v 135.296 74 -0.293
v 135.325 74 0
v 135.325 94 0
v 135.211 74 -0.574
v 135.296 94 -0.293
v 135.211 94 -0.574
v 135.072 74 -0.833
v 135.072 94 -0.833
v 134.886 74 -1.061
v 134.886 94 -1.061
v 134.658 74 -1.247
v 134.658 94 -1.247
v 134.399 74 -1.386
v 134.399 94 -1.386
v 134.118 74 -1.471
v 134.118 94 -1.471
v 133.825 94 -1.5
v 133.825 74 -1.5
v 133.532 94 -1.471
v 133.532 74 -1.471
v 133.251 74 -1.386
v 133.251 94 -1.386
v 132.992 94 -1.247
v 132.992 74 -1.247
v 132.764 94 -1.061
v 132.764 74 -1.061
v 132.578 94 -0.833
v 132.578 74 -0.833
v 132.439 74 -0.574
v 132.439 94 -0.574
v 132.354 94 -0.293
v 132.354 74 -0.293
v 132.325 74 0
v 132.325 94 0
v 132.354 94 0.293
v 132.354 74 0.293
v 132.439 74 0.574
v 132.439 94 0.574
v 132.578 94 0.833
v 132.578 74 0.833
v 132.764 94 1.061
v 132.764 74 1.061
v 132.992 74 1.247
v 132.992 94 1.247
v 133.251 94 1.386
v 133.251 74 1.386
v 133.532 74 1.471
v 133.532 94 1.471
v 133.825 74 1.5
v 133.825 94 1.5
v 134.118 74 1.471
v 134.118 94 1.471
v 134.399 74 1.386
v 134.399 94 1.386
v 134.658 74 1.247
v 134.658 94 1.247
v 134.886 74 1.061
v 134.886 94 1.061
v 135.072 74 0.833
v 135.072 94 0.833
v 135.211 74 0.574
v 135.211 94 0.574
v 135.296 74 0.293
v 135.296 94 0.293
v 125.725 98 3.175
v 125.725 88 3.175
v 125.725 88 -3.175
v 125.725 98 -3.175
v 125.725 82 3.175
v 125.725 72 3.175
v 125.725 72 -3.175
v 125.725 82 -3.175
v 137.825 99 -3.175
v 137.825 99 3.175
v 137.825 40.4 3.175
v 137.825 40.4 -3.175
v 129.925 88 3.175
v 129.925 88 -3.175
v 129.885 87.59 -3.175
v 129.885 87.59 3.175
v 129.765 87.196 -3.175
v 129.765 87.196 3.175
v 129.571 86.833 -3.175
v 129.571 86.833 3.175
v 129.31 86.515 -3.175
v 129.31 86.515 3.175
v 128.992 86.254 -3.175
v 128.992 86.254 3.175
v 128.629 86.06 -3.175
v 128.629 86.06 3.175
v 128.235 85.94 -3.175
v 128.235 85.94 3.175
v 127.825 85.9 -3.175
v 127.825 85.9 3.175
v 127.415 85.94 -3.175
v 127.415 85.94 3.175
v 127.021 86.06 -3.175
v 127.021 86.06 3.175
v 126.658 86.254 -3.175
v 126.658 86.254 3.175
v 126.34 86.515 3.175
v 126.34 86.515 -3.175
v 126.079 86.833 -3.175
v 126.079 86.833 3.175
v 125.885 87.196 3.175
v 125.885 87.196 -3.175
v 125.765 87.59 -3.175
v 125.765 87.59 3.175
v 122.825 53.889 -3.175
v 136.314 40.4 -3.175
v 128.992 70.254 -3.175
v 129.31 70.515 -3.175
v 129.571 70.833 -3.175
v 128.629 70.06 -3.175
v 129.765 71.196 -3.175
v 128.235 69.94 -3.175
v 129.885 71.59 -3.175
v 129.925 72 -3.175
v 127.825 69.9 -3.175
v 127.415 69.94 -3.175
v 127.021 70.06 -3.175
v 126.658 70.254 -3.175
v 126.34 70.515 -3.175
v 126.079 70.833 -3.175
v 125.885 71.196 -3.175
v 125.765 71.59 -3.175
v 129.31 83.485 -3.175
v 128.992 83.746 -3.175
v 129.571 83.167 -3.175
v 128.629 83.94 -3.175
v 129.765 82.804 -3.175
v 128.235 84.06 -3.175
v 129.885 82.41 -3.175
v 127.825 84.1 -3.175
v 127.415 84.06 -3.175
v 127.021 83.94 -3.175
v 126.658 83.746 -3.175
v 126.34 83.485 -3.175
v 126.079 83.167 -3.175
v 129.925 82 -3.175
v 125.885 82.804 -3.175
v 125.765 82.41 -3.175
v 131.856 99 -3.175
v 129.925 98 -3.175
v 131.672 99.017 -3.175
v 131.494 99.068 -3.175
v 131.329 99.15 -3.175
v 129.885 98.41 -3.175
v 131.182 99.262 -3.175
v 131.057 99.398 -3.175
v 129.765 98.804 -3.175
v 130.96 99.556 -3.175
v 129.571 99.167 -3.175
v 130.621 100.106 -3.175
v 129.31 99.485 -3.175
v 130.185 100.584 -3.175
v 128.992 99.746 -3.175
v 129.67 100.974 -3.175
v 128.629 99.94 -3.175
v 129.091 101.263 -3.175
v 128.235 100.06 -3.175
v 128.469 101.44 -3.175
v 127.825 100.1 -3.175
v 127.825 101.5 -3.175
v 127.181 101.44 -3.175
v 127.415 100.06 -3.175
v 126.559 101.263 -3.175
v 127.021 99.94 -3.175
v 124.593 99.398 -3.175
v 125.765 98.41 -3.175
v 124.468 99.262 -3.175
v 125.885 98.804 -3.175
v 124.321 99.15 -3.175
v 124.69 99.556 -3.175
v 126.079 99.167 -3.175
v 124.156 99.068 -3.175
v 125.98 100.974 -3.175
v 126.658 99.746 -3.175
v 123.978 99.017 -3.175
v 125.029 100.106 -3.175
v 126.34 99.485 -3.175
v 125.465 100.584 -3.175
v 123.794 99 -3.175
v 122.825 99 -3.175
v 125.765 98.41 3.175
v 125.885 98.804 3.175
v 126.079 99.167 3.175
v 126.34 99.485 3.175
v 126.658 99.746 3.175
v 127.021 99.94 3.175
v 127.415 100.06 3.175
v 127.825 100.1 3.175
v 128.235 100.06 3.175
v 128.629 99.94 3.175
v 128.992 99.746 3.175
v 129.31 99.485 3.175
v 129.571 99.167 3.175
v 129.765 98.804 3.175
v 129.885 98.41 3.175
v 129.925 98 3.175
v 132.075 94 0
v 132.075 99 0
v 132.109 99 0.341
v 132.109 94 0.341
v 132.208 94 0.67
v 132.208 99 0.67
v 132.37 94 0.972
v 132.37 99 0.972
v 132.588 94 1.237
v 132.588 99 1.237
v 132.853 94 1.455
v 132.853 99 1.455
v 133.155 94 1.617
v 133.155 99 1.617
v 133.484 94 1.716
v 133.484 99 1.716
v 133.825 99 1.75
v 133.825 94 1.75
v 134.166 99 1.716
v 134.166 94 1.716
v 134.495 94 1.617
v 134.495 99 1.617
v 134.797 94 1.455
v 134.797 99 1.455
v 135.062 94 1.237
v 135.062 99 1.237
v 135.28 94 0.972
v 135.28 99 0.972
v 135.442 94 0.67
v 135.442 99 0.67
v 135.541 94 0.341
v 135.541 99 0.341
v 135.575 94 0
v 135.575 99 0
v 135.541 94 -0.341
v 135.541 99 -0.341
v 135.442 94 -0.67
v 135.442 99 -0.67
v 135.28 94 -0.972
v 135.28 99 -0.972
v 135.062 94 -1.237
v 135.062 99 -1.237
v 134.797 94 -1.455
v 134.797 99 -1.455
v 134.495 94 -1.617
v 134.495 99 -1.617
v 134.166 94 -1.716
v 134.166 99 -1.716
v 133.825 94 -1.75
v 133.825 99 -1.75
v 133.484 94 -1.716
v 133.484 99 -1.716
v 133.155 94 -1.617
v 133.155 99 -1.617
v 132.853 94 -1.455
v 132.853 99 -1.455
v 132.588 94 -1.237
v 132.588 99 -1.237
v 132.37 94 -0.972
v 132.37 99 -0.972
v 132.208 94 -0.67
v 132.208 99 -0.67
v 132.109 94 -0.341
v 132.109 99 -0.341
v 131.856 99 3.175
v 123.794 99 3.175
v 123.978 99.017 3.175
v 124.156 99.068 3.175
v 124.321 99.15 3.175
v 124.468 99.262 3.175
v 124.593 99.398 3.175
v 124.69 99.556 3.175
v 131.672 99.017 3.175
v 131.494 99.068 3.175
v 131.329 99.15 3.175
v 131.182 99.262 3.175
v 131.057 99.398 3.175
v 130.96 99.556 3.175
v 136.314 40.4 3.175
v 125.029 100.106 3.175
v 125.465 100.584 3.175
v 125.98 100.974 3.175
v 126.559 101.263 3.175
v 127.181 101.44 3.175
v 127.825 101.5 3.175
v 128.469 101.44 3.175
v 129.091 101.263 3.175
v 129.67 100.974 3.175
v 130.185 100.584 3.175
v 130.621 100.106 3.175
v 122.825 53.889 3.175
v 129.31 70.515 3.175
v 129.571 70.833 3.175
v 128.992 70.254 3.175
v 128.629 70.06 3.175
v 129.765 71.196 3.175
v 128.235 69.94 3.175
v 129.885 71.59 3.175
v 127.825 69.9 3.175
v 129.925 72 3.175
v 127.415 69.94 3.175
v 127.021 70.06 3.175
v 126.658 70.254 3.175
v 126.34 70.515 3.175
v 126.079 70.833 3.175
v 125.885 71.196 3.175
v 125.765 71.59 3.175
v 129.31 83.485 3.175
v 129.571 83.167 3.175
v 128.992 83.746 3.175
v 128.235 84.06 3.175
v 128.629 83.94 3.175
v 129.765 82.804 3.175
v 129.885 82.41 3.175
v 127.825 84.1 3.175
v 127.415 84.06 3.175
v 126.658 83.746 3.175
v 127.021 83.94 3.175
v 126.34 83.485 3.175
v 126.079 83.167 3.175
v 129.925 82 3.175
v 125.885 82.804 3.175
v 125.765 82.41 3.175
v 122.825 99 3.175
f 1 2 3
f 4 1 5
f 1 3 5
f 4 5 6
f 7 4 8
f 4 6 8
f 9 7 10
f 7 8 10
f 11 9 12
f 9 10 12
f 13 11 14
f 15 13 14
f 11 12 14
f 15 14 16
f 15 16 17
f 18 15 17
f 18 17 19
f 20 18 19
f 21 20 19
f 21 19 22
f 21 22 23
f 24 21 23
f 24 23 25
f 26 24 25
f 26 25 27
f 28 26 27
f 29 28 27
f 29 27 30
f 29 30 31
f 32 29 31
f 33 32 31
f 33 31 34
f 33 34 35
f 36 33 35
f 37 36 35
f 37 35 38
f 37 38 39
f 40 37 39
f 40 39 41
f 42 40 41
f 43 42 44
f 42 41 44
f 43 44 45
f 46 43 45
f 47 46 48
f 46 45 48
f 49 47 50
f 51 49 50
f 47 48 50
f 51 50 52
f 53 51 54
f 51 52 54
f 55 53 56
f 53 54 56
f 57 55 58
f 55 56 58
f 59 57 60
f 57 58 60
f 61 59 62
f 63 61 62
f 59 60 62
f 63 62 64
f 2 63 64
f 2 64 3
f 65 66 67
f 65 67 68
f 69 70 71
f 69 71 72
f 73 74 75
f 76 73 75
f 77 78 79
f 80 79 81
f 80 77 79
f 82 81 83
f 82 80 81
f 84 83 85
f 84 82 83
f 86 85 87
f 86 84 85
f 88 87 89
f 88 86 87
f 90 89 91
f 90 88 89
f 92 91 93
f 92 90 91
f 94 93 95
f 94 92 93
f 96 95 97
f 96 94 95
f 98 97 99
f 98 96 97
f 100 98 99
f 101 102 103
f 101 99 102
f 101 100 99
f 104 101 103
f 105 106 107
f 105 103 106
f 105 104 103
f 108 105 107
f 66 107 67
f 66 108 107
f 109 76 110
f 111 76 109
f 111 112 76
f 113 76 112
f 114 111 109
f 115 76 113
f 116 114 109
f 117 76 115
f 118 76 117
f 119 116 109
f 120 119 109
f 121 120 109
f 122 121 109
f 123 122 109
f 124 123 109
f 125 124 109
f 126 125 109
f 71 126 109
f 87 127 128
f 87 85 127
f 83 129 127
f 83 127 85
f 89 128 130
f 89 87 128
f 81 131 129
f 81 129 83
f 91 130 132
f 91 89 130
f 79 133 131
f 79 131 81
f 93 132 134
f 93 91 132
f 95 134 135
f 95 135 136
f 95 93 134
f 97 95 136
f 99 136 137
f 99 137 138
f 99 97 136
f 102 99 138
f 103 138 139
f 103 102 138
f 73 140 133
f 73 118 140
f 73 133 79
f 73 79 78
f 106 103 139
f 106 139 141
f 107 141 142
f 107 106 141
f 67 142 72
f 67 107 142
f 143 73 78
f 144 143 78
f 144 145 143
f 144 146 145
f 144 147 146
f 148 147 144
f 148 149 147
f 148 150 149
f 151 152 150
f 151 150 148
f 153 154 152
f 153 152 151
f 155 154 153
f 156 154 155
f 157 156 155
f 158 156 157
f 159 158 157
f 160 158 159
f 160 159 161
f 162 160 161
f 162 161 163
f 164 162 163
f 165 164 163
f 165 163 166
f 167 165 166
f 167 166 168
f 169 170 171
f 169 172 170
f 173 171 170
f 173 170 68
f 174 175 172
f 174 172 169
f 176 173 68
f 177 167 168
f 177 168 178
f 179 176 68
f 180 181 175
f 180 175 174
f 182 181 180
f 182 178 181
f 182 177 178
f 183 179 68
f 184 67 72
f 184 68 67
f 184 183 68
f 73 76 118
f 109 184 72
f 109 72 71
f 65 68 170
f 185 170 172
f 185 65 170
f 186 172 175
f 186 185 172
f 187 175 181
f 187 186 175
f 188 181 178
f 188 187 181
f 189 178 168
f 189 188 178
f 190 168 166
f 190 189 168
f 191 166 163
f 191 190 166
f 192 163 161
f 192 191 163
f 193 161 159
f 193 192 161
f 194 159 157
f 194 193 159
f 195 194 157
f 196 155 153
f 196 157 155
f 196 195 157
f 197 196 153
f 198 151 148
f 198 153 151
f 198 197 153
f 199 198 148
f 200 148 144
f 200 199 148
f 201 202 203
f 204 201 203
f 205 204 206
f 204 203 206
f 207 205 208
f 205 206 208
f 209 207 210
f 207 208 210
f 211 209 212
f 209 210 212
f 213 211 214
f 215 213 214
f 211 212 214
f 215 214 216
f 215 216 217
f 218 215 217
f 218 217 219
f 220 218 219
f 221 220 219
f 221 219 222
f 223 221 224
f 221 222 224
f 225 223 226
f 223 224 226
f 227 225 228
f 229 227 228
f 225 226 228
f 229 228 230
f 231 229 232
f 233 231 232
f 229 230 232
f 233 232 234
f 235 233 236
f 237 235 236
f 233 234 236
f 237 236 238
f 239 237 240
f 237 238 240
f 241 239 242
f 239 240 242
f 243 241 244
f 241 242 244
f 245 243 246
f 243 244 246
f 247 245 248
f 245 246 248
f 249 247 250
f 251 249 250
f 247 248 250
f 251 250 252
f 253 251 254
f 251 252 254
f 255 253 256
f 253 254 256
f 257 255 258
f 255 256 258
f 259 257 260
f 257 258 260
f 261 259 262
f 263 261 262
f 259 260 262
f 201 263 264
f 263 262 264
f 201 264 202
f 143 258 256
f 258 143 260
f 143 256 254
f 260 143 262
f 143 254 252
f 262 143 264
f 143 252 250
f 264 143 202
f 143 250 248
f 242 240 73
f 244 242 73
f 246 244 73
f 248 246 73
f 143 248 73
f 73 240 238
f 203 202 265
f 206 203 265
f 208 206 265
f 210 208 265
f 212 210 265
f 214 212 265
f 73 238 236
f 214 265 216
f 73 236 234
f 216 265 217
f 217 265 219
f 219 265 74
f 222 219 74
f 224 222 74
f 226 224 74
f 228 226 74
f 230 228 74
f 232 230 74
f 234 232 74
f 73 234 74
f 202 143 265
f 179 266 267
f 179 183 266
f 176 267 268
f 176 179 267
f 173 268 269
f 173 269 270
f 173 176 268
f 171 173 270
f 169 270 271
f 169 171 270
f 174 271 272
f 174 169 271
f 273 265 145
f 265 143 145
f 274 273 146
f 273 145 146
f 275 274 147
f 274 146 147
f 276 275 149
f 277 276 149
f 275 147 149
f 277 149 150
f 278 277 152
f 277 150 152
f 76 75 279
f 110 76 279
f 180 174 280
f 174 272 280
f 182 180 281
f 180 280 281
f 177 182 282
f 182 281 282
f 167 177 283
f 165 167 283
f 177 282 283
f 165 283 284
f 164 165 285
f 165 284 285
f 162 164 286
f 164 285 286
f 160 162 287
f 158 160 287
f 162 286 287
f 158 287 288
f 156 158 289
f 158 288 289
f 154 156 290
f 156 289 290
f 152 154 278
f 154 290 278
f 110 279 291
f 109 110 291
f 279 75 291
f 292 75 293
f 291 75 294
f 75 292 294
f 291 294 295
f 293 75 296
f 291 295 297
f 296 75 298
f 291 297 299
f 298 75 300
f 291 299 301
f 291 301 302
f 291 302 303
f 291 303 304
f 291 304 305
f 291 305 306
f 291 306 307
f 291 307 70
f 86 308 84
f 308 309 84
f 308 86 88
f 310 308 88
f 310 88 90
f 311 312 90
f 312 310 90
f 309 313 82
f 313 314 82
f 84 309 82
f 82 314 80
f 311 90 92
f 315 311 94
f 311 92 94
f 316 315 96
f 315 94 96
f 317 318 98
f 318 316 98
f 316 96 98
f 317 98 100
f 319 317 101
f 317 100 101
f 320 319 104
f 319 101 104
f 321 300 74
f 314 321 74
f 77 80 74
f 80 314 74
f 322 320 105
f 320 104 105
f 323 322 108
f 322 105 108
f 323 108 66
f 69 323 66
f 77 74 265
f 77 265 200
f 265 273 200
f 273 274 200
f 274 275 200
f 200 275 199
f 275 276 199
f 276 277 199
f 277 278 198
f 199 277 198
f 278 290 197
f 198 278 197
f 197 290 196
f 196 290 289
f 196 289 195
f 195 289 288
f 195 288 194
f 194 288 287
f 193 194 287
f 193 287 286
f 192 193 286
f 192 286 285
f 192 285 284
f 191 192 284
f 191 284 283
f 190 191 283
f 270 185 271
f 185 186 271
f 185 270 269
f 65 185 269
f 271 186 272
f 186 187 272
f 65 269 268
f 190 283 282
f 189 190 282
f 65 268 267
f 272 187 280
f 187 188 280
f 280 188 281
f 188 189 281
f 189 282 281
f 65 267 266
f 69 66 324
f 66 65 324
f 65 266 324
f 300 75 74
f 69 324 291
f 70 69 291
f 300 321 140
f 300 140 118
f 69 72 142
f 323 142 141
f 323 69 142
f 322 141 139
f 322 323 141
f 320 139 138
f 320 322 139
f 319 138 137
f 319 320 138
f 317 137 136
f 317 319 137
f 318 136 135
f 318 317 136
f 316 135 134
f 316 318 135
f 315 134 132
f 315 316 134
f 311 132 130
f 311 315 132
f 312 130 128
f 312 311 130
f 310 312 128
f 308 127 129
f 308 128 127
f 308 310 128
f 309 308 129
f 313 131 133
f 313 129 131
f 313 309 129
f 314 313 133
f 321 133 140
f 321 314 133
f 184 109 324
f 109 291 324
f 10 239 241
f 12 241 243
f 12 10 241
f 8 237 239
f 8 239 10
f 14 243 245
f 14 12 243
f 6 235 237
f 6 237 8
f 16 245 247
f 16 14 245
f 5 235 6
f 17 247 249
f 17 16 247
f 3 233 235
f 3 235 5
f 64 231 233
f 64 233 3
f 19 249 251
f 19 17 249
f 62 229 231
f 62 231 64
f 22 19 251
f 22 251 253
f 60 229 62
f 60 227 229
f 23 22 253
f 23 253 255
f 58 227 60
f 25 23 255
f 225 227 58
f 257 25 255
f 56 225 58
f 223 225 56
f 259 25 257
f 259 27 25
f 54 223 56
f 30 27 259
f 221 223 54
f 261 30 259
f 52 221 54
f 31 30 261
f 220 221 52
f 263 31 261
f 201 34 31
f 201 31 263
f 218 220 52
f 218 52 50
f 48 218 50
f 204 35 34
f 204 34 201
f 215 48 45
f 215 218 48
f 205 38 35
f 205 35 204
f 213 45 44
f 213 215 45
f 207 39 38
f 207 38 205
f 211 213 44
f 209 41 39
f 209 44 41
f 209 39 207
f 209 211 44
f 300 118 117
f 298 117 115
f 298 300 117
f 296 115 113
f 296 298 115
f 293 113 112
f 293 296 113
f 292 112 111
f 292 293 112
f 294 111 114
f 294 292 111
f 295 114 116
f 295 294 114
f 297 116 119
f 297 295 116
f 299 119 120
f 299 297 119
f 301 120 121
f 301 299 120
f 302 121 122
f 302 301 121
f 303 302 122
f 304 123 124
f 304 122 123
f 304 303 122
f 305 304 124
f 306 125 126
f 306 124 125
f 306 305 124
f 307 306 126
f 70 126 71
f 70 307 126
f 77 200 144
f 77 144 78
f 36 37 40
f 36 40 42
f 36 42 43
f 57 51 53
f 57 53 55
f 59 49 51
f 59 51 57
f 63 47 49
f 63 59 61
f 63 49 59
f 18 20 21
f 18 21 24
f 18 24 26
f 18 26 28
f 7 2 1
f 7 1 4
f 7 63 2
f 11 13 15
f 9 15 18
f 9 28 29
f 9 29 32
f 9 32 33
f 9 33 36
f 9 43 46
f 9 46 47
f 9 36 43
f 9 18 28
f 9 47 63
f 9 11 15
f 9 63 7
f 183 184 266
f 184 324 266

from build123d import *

# Parameters (mm, degrees)
BOSS_EXTRUDE1_DEPTH      = 3.175
BOSS_EXTRUDE1_DEPTH_BACK = 3.175
CUT_EXTRUDE1_DEPTH       = 7.35
SKETCH3_R                = 1.5
CUT_EXTRUDE2_DEPTH       = 25
SKETCH4_R                = 1.75
CUT_EXTRUDE3_DEPTH       = 5
FILLET1_R                = 1


with BuildPart() as part:
    # Sketch1 → Boss-Extrude1 (new body, two sides)
    with BuildSketch(Plane.XY) as boss_extrude1_sk:
        with BuildLine():
            Line((136.313708499, 40.4), (122.825, 53.888708499))
            Line((122.825, 53.888708499), (122.825, 99))
            Line((122.825, 99), (124.470898034, 99))
            ThreePointArc((124.470898034, 99), (127.825, 101.5), (131.179101966, 99))
            Line((131.179101966, 99), (137.825, 99))
            Line((137.825, 99), (137.825, 40.4))
            Line((137.825, 40.4), (136.313708499, 40.4))
        make_face()
    extrude(amount=BOSS_EXTRUDE1_DEPTH)
    extrude(boss_extrude1_sk.sketch, amount=-BOSS_EXTRUDE1_DEPTH_BACK)

    # Sketch2 → Cut-Extrude1 (cut, through all)
    with BuildSketch(Plane.XY.offset(3.175)):
        with BuildLine():
            Line((125.725, 72), (125.725, 82))
            ThreePointArc((125.725, 82), (127.825, 84.1), (129.925, 82))
            Line((129.925, 82), (129.925, 72))
            ThreePointArc((129.925, 72), (127.825, 69.9), (125.725, 72))
        make_face()
        with BuildLine():
            Line((125.725, 88), (125.725, 98))
            ThreePointArc((125.725, 98), (127.825, 100.1), (129.925, 98))
            Line((129.925, 98), (129.925, 88))
            ThreePointArc((129.925, 88), (127.825, 85.9), (125.725, 88))
        make_face()
    extrude(amount=-CUT_EXTRUDE1_DEPTH, mode=Mode.SUBTRACT)

    # Sketch3 → Cut-Extrude2 (cut)
    with BuildSketch(Plane(origin=(0, 99, 0), x_dir=(1, 0, 0), z_dir=(0, 1, 0))):
        with Locations((133.825, 0)):
            Circle(SKETCH3_R)
    extrude(amount=-CUT_EXTRUDE2_DEPTH, mode=Mode.SUBTRACT)

    # Sketch4 → Cut-Extrude3 (cut)
    with BuildSketch(Plane(origin=(0, 99, 0), x_dir=(-1, 0, 0), z_dir=(0, 1, 0))):
        with Locations((-133.825, 0)):
            Circle(SKETCH4_R)
    extrude(amount=-CUT_EXTRUDE3_DEPTH, mode=Mode.SUBTRACT)

    # Fillet1
    fillet1_edges = [part.edges().sort_by_distance(p)[0] for p in [
        (124.470898034, 99, 0),
        (131.179101966, 99, 0),
    ]]
    fillet(fillet1_edges, radius=FILLET1_R)


solid = part.part
